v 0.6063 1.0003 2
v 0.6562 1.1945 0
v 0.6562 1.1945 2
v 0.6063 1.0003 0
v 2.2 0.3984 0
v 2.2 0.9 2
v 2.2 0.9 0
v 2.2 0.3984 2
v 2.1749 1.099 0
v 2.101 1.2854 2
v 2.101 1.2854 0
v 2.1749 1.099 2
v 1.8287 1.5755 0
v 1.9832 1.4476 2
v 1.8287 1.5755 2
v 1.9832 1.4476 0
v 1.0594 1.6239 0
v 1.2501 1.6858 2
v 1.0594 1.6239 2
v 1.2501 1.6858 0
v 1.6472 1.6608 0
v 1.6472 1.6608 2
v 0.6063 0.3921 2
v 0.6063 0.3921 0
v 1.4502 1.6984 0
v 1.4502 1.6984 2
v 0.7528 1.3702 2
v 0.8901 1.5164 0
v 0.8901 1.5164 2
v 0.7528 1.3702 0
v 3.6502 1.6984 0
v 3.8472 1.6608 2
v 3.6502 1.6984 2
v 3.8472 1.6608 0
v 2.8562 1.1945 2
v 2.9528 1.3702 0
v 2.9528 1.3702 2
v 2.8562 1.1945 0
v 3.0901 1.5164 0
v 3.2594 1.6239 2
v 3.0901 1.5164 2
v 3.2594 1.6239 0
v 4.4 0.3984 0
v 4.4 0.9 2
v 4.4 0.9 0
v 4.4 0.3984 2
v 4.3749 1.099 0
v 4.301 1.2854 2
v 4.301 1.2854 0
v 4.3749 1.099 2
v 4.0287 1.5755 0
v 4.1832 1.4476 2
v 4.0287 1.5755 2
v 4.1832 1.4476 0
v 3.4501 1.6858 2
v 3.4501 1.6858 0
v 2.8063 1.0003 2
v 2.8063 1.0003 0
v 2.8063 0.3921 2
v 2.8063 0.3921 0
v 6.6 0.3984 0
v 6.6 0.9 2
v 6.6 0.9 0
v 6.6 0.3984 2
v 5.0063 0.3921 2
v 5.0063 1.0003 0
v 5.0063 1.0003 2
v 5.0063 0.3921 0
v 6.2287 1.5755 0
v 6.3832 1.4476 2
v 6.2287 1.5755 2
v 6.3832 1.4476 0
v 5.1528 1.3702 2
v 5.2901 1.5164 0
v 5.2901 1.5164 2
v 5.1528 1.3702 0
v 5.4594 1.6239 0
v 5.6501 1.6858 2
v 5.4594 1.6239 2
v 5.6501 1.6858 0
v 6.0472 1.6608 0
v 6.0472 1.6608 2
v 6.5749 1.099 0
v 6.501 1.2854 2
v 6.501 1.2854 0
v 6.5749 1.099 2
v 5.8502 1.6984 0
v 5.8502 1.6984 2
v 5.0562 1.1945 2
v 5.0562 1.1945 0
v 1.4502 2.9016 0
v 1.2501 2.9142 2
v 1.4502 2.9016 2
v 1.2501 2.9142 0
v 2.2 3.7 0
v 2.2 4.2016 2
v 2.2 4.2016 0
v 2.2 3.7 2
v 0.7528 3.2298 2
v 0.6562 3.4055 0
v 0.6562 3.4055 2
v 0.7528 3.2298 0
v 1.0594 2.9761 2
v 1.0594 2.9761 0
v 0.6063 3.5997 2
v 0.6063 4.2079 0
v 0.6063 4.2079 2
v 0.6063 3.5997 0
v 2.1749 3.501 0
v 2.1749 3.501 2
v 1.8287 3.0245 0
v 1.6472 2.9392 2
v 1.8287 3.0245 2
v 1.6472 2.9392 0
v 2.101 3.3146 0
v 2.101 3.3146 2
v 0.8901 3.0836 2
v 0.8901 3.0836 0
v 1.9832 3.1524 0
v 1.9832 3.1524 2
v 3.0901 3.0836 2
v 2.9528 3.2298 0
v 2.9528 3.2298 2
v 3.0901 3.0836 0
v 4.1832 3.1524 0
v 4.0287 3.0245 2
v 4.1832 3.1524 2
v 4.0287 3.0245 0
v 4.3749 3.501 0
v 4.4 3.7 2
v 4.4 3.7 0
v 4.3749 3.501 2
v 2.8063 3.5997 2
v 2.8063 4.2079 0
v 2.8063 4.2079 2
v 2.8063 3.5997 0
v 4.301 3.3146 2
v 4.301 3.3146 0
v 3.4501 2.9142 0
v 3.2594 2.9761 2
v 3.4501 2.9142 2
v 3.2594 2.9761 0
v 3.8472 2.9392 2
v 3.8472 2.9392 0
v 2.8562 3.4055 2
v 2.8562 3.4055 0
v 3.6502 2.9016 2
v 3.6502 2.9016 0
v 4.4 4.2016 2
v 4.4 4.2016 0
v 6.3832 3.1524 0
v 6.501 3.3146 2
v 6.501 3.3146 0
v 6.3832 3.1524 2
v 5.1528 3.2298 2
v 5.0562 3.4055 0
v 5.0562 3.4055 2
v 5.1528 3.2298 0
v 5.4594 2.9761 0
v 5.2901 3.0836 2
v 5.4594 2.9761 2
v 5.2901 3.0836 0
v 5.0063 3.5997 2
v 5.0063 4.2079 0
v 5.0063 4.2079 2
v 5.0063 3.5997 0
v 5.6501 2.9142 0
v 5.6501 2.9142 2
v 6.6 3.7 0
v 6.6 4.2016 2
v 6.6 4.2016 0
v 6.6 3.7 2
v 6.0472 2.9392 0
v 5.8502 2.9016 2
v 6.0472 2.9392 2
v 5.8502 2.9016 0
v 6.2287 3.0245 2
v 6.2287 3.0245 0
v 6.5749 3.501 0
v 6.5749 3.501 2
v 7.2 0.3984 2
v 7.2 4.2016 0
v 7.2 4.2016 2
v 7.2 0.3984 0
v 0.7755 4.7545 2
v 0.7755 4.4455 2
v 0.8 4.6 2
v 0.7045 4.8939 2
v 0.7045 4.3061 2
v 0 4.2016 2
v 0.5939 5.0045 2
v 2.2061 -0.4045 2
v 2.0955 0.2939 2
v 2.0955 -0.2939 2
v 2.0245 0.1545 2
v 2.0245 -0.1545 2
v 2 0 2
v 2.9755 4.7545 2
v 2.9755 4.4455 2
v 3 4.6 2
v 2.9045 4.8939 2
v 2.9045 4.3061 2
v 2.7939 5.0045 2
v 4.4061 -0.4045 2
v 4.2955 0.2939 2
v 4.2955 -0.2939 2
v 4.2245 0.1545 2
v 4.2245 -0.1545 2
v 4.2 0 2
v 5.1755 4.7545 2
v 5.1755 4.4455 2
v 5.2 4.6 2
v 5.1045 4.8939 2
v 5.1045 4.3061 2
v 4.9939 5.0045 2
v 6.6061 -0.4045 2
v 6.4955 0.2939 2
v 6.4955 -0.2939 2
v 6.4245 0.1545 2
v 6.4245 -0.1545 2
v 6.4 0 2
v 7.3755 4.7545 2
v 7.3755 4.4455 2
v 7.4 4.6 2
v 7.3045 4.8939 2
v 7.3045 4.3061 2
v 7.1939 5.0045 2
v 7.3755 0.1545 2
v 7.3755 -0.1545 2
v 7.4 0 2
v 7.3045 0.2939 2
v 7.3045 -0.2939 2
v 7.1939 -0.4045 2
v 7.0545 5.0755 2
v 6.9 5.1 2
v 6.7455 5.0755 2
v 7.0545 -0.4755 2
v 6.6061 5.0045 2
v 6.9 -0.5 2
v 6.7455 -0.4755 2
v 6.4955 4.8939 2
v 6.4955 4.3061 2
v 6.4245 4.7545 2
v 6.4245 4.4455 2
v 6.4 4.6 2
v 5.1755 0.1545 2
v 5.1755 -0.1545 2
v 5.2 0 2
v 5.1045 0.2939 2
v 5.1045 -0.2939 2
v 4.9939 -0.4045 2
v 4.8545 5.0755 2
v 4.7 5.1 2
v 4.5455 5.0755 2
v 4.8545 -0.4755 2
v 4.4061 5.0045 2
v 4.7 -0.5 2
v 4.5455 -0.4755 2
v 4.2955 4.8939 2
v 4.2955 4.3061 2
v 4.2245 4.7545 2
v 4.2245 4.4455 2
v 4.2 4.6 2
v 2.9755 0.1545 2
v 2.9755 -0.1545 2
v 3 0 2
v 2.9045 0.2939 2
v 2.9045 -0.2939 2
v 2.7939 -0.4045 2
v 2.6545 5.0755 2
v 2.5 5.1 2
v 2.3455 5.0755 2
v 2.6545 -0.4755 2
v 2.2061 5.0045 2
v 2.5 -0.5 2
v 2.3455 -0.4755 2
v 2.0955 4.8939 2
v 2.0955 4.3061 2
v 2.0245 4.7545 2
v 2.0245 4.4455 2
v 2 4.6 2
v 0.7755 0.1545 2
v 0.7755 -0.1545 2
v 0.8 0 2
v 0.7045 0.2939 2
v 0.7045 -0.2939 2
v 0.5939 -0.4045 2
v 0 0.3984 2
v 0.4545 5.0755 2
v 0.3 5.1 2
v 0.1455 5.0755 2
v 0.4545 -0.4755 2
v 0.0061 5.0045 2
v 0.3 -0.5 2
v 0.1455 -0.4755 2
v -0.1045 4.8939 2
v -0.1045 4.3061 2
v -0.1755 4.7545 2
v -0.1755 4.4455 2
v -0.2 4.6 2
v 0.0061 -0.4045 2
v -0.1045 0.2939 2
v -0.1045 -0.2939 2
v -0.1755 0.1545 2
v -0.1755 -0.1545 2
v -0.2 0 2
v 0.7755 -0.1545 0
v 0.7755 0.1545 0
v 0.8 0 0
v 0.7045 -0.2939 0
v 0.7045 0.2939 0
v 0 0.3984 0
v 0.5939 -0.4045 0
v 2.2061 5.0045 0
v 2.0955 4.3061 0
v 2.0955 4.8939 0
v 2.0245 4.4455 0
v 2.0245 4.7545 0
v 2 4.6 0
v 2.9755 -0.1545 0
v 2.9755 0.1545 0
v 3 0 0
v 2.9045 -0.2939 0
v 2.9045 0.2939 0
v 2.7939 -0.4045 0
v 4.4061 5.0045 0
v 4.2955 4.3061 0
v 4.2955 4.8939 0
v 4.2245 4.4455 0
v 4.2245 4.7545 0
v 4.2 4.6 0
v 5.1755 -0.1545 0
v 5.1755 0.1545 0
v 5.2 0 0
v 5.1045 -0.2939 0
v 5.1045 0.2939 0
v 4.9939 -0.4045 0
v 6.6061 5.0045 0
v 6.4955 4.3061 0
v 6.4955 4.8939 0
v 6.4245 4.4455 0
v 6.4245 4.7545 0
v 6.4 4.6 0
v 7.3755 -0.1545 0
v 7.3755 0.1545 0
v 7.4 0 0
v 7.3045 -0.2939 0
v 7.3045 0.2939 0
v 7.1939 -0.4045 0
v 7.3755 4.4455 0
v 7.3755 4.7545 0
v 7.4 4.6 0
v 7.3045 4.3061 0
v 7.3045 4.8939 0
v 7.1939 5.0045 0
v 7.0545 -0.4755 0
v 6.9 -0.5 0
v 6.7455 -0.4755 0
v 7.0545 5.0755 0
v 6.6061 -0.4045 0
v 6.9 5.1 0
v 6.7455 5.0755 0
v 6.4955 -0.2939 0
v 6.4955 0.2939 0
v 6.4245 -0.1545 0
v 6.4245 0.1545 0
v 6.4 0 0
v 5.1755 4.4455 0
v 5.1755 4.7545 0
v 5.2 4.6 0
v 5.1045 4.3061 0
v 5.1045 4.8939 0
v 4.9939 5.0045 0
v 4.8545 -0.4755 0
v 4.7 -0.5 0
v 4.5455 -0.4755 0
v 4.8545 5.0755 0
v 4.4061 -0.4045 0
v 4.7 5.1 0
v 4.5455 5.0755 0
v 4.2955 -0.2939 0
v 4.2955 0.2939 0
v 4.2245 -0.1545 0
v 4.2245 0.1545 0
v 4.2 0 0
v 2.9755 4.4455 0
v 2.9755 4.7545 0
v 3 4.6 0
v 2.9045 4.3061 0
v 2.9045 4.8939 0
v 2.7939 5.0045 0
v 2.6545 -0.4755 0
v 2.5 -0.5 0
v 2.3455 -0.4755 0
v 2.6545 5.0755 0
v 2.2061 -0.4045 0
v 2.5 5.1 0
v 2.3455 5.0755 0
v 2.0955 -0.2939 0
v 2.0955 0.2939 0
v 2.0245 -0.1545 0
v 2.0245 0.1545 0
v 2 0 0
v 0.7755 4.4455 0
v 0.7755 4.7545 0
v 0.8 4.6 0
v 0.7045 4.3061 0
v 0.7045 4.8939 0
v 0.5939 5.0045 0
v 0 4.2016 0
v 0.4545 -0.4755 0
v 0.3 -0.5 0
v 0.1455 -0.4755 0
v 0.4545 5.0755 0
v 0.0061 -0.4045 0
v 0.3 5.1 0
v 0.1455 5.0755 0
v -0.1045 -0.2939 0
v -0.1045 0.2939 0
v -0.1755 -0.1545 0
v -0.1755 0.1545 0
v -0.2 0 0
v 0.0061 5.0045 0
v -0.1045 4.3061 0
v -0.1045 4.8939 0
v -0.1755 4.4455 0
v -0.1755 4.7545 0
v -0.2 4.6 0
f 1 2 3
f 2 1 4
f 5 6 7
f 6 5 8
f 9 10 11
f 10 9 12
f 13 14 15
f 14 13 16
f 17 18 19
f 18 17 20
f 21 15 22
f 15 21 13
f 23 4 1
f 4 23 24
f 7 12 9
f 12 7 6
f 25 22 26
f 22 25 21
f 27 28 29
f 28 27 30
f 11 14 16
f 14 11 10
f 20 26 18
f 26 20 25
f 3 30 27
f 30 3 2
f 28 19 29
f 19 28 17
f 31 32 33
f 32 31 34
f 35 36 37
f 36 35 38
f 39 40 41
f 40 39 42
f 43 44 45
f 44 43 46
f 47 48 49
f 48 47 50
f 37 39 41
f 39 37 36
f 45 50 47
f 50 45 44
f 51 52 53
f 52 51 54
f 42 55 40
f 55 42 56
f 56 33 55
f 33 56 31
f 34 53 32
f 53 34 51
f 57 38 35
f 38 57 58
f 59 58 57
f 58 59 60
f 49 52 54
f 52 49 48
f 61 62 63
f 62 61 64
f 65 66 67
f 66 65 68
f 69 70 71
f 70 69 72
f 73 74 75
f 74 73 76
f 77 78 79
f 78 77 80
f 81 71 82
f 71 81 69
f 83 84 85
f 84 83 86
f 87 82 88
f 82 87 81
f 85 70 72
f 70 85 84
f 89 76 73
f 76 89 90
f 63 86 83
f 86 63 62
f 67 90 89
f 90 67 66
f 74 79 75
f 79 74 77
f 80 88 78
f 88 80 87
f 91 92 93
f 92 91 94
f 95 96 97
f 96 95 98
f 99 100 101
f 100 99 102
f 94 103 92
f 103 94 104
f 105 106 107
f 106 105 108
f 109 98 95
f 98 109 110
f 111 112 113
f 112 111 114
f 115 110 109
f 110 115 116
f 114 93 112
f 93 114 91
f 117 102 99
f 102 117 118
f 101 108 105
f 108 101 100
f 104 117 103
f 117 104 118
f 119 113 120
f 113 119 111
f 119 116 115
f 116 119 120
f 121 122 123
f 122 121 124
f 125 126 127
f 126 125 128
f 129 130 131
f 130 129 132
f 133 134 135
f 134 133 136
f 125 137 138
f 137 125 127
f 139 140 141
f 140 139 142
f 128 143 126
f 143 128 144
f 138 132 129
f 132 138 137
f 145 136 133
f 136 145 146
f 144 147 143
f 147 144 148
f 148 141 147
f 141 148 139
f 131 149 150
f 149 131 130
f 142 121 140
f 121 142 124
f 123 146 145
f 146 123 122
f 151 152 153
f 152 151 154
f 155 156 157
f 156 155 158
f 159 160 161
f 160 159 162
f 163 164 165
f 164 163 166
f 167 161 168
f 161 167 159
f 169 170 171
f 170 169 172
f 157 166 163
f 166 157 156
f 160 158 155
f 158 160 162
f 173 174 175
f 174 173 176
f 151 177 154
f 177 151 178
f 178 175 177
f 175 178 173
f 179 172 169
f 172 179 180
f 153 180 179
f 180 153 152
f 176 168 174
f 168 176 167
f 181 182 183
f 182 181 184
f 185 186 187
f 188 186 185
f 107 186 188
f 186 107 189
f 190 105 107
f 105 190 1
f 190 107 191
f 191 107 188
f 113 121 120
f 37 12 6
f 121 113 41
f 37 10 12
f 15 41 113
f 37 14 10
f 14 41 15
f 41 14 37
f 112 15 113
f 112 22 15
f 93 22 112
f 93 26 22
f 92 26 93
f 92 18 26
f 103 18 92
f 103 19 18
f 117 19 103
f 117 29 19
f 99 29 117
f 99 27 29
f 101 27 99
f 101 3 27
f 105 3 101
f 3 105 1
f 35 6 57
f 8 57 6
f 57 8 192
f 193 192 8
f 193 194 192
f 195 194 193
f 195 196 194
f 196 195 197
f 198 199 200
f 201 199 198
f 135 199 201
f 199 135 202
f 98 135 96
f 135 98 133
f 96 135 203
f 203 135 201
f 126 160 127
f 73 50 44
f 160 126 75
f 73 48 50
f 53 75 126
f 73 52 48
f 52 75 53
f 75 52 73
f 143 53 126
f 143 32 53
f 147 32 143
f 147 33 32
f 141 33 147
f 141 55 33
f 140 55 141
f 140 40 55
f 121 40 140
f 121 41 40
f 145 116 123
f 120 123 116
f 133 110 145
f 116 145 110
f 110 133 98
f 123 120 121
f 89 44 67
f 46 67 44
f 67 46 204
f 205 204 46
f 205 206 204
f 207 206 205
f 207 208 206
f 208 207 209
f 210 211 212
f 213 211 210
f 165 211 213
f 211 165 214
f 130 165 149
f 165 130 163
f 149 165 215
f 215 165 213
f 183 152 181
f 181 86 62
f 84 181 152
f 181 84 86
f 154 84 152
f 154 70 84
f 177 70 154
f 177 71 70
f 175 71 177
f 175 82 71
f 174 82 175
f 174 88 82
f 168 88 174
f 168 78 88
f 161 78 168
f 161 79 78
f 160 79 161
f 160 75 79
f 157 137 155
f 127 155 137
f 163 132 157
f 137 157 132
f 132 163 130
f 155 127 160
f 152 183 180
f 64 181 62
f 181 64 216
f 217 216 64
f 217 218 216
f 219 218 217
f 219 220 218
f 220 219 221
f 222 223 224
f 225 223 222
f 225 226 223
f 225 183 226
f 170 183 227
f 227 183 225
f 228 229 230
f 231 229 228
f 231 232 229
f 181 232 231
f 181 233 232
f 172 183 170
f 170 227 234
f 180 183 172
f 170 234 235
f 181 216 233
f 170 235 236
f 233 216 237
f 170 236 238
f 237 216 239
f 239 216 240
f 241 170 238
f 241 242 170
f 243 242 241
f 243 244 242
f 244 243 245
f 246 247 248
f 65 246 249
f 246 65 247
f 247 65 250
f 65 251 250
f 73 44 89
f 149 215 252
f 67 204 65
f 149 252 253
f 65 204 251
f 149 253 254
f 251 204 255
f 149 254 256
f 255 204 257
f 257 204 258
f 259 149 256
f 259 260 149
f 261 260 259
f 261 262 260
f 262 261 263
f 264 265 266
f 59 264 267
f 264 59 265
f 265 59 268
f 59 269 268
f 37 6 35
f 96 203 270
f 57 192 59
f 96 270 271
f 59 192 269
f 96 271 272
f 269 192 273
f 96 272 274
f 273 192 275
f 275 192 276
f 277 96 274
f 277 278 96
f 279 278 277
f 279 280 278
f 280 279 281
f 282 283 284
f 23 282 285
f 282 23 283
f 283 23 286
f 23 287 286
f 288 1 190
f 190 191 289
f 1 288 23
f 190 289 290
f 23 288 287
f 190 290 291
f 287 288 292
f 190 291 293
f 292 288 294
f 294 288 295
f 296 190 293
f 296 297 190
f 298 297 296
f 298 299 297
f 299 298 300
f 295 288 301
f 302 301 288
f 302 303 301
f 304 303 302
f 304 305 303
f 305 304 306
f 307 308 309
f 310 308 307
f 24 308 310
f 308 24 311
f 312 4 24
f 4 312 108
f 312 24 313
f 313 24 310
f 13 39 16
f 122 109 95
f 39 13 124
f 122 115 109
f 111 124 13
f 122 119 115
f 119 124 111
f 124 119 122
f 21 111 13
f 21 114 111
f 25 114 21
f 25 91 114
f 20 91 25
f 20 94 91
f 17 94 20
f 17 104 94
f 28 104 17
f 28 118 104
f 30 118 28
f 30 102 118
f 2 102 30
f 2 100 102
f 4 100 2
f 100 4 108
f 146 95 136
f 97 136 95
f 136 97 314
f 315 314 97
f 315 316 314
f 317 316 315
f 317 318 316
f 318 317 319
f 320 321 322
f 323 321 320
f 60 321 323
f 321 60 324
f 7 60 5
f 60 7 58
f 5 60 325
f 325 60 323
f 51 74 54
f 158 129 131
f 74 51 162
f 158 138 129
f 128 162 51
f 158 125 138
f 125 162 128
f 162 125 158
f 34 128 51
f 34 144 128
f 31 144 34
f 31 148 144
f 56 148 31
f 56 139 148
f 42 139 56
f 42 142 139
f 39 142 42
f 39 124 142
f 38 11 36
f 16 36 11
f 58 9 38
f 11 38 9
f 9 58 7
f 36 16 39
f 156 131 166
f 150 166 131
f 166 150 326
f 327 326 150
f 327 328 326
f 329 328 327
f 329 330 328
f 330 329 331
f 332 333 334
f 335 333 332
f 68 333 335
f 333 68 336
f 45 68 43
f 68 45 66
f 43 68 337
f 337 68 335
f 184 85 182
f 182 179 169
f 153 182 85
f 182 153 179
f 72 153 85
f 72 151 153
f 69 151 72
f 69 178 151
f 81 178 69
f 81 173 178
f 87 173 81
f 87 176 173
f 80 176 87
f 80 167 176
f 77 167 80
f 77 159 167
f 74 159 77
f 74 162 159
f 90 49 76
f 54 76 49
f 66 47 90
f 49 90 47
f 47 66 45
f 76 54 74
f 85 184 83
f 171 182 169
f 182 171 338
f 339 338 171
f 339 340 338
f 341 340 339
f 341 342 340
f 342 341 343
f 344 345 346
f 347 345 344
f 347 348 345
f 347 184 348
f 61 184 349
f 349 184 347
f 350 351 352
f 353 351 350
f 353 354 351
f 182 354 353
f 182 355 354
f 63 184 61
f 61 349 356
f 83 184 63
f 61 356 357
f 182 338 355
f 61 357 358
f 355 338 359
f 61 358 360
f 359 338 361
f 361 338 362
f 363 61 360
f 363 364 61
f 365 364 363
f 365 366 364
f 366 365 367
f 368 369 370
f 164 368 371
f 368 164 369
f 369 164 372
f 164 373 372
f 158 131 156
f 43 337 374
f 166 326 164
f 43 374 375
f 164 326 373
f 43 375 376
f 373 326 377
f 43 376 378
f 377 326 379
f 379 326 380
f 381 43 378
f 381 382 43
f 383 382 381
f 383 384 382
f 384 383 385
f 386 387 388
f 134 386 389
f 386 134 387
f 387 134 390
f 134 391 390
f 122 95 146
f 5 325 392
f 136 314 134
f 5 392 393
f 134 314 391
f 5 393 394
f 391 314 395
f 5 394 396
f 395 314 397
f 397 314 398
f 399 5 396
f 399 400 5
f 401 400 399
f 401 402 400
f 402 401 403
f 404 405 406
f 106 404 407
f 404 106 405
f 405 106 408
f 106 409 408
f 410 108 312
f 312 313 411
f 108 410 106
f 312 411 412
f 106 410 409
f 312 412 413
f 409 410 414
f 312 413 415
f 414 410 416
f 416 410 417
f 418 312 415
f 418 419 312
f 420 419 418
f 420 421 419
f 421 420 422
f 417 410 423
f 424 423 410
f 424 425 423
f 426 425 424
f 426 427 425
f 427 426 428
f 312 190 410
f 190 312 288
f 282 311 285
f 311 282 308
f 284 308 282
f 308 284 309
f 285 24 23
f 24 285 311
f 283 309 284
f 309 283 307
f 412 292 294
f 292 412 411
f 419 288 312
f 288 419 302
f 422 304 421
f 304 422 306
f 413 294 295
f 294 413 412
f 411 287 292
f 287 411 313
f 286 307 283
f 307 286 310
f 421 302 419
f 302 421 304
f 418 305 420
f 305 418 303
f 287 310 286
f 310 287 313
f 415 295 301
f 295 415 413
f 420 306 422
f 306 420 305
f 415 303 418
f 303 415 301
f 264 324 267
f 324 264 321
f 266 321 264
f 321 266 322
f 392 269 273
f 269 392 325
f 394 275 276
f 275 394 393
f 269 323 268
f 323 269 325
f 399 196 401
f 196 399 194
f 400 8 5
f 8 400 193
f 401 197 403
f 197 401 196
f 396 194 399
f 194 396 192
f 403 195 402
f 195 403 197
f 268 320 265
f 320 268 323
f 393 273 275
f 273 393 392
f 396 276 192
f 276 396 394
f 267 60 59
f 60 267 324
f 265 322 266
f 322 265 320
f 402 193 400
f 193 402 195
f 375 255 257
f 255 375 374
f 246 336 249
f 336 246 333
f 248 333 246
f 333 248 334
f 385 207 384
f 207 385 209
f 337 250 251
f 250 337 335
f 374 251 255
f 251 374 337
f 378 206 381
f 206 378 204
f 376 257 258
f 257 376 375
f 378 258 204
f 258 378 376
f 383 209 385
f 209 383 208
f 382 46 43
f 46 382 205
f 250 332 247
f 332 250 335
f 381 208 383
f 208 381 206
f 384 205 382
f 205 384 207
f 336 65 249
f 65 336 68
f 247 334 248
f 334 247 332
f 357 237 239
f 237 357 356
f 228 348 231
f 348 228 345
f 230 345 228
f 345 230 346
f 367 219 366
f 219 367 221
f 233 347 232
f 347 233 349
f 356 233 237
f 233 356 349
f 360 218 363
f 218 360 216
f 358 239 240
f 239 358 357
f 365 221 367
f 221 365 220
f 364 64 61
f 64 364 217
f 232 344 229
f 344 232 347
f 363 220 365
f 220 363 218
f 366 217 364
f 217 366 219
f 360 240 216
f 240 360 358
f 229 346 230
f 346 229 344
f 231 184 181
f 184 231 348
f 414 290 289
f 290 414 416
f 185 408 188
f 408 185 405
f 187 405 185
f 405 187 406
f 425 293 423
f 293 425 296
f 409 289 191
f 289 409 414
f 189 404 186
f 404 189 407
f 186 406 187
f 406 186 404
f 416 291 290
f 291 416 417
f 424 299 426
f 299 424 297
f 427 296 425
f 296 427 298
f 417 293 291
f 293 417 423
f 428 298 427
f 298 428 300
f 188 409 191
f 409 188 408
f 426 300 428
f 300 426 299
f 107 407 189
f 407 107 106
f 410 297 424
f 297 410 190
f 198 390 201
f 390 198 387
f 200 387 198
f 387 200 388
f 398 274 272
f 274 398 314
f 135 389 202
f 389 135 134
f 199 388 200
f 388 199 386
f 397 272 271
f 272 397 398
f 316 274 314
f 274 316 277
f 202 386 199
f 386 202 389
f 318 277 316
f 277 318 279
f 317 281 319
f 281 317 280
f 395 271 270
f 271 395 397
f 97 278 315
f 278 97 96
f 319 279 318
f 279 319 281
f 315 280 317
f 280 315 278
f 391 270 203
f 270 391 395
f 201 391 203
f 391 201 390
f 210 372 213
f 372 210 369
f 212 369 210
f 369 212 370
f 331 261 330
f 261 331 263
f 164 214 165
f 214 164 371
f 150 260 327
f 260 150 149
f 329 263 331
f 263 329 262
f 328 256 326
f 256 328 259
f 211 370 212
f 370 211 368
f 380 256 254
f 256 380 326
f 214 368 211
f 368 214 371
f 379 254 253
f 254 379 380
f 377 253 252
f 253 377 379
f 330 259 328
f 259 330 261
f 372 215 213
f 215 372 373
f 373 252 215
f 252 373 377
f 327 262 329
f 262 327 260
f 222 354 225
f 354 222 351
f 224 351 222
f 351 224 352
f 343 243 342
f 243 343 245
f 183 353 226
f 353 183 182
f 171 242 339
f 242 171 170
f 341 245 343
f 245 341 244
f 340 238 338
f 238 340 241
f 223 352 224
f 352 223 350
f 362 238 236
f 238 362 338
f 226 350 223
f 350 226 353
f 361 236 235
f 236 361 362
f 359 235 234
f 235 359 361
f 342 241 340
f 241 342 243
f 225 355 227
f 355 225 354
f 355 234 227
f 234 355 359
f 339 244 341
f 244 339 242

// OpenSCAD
/* [Parameters] */
width=4.6;
height=2;
// Holes per edge
holes=3;
// Hole diameter
diameter=1.6;
// Separation between holes
separation=0.6;
// Edge roundness
edge=0.5;

union(){

  difference(){

    cube([diameter*holes+separation*(holes+1),width,height]);

    for(i=[0:holes-1]){
     
      hull(){
        translate([(separation+diameter/2)+(separation+diameter)*i,0.1+diameter/2,-0.05])
          cylinder(r=diameter/2, h=height+0.1,$fn=25);
      
        translate([(separation+diameter/2)+(separation+diameter)*i,-diameter/3,-0.05])
          cylinder(r=diameter/2, h=height+0.1,$fn=25);
      }
    }

    for(i=[0:holes-1]){
      hull(){
        translate([(separation+diameter/2)+(separation+diameter)*i, width-diameter/2-0.1, -0.05])
          cylinder(r=diameter/2, h=height+0.1,$fn=25);
      
        translate([(separation+diameter/2)+(separation+diameter)*i,width+diameter/3,-0.05])
          cylinder(r=diameter/2, h=height+0.1,$fn=25);
      }
    }

  }

  for(i=[0:holes]){
    translate([separation/2+(diameter+separation)*i,0,0])
      cylinder(r=edge, h=height, $fn=20);
  }

  for(i=[0:holes]){
    translate([separation/2+(diameter+separation)*i,width,0])
      cylinder(r=edge, h=height, $fn=20);
  }

}
